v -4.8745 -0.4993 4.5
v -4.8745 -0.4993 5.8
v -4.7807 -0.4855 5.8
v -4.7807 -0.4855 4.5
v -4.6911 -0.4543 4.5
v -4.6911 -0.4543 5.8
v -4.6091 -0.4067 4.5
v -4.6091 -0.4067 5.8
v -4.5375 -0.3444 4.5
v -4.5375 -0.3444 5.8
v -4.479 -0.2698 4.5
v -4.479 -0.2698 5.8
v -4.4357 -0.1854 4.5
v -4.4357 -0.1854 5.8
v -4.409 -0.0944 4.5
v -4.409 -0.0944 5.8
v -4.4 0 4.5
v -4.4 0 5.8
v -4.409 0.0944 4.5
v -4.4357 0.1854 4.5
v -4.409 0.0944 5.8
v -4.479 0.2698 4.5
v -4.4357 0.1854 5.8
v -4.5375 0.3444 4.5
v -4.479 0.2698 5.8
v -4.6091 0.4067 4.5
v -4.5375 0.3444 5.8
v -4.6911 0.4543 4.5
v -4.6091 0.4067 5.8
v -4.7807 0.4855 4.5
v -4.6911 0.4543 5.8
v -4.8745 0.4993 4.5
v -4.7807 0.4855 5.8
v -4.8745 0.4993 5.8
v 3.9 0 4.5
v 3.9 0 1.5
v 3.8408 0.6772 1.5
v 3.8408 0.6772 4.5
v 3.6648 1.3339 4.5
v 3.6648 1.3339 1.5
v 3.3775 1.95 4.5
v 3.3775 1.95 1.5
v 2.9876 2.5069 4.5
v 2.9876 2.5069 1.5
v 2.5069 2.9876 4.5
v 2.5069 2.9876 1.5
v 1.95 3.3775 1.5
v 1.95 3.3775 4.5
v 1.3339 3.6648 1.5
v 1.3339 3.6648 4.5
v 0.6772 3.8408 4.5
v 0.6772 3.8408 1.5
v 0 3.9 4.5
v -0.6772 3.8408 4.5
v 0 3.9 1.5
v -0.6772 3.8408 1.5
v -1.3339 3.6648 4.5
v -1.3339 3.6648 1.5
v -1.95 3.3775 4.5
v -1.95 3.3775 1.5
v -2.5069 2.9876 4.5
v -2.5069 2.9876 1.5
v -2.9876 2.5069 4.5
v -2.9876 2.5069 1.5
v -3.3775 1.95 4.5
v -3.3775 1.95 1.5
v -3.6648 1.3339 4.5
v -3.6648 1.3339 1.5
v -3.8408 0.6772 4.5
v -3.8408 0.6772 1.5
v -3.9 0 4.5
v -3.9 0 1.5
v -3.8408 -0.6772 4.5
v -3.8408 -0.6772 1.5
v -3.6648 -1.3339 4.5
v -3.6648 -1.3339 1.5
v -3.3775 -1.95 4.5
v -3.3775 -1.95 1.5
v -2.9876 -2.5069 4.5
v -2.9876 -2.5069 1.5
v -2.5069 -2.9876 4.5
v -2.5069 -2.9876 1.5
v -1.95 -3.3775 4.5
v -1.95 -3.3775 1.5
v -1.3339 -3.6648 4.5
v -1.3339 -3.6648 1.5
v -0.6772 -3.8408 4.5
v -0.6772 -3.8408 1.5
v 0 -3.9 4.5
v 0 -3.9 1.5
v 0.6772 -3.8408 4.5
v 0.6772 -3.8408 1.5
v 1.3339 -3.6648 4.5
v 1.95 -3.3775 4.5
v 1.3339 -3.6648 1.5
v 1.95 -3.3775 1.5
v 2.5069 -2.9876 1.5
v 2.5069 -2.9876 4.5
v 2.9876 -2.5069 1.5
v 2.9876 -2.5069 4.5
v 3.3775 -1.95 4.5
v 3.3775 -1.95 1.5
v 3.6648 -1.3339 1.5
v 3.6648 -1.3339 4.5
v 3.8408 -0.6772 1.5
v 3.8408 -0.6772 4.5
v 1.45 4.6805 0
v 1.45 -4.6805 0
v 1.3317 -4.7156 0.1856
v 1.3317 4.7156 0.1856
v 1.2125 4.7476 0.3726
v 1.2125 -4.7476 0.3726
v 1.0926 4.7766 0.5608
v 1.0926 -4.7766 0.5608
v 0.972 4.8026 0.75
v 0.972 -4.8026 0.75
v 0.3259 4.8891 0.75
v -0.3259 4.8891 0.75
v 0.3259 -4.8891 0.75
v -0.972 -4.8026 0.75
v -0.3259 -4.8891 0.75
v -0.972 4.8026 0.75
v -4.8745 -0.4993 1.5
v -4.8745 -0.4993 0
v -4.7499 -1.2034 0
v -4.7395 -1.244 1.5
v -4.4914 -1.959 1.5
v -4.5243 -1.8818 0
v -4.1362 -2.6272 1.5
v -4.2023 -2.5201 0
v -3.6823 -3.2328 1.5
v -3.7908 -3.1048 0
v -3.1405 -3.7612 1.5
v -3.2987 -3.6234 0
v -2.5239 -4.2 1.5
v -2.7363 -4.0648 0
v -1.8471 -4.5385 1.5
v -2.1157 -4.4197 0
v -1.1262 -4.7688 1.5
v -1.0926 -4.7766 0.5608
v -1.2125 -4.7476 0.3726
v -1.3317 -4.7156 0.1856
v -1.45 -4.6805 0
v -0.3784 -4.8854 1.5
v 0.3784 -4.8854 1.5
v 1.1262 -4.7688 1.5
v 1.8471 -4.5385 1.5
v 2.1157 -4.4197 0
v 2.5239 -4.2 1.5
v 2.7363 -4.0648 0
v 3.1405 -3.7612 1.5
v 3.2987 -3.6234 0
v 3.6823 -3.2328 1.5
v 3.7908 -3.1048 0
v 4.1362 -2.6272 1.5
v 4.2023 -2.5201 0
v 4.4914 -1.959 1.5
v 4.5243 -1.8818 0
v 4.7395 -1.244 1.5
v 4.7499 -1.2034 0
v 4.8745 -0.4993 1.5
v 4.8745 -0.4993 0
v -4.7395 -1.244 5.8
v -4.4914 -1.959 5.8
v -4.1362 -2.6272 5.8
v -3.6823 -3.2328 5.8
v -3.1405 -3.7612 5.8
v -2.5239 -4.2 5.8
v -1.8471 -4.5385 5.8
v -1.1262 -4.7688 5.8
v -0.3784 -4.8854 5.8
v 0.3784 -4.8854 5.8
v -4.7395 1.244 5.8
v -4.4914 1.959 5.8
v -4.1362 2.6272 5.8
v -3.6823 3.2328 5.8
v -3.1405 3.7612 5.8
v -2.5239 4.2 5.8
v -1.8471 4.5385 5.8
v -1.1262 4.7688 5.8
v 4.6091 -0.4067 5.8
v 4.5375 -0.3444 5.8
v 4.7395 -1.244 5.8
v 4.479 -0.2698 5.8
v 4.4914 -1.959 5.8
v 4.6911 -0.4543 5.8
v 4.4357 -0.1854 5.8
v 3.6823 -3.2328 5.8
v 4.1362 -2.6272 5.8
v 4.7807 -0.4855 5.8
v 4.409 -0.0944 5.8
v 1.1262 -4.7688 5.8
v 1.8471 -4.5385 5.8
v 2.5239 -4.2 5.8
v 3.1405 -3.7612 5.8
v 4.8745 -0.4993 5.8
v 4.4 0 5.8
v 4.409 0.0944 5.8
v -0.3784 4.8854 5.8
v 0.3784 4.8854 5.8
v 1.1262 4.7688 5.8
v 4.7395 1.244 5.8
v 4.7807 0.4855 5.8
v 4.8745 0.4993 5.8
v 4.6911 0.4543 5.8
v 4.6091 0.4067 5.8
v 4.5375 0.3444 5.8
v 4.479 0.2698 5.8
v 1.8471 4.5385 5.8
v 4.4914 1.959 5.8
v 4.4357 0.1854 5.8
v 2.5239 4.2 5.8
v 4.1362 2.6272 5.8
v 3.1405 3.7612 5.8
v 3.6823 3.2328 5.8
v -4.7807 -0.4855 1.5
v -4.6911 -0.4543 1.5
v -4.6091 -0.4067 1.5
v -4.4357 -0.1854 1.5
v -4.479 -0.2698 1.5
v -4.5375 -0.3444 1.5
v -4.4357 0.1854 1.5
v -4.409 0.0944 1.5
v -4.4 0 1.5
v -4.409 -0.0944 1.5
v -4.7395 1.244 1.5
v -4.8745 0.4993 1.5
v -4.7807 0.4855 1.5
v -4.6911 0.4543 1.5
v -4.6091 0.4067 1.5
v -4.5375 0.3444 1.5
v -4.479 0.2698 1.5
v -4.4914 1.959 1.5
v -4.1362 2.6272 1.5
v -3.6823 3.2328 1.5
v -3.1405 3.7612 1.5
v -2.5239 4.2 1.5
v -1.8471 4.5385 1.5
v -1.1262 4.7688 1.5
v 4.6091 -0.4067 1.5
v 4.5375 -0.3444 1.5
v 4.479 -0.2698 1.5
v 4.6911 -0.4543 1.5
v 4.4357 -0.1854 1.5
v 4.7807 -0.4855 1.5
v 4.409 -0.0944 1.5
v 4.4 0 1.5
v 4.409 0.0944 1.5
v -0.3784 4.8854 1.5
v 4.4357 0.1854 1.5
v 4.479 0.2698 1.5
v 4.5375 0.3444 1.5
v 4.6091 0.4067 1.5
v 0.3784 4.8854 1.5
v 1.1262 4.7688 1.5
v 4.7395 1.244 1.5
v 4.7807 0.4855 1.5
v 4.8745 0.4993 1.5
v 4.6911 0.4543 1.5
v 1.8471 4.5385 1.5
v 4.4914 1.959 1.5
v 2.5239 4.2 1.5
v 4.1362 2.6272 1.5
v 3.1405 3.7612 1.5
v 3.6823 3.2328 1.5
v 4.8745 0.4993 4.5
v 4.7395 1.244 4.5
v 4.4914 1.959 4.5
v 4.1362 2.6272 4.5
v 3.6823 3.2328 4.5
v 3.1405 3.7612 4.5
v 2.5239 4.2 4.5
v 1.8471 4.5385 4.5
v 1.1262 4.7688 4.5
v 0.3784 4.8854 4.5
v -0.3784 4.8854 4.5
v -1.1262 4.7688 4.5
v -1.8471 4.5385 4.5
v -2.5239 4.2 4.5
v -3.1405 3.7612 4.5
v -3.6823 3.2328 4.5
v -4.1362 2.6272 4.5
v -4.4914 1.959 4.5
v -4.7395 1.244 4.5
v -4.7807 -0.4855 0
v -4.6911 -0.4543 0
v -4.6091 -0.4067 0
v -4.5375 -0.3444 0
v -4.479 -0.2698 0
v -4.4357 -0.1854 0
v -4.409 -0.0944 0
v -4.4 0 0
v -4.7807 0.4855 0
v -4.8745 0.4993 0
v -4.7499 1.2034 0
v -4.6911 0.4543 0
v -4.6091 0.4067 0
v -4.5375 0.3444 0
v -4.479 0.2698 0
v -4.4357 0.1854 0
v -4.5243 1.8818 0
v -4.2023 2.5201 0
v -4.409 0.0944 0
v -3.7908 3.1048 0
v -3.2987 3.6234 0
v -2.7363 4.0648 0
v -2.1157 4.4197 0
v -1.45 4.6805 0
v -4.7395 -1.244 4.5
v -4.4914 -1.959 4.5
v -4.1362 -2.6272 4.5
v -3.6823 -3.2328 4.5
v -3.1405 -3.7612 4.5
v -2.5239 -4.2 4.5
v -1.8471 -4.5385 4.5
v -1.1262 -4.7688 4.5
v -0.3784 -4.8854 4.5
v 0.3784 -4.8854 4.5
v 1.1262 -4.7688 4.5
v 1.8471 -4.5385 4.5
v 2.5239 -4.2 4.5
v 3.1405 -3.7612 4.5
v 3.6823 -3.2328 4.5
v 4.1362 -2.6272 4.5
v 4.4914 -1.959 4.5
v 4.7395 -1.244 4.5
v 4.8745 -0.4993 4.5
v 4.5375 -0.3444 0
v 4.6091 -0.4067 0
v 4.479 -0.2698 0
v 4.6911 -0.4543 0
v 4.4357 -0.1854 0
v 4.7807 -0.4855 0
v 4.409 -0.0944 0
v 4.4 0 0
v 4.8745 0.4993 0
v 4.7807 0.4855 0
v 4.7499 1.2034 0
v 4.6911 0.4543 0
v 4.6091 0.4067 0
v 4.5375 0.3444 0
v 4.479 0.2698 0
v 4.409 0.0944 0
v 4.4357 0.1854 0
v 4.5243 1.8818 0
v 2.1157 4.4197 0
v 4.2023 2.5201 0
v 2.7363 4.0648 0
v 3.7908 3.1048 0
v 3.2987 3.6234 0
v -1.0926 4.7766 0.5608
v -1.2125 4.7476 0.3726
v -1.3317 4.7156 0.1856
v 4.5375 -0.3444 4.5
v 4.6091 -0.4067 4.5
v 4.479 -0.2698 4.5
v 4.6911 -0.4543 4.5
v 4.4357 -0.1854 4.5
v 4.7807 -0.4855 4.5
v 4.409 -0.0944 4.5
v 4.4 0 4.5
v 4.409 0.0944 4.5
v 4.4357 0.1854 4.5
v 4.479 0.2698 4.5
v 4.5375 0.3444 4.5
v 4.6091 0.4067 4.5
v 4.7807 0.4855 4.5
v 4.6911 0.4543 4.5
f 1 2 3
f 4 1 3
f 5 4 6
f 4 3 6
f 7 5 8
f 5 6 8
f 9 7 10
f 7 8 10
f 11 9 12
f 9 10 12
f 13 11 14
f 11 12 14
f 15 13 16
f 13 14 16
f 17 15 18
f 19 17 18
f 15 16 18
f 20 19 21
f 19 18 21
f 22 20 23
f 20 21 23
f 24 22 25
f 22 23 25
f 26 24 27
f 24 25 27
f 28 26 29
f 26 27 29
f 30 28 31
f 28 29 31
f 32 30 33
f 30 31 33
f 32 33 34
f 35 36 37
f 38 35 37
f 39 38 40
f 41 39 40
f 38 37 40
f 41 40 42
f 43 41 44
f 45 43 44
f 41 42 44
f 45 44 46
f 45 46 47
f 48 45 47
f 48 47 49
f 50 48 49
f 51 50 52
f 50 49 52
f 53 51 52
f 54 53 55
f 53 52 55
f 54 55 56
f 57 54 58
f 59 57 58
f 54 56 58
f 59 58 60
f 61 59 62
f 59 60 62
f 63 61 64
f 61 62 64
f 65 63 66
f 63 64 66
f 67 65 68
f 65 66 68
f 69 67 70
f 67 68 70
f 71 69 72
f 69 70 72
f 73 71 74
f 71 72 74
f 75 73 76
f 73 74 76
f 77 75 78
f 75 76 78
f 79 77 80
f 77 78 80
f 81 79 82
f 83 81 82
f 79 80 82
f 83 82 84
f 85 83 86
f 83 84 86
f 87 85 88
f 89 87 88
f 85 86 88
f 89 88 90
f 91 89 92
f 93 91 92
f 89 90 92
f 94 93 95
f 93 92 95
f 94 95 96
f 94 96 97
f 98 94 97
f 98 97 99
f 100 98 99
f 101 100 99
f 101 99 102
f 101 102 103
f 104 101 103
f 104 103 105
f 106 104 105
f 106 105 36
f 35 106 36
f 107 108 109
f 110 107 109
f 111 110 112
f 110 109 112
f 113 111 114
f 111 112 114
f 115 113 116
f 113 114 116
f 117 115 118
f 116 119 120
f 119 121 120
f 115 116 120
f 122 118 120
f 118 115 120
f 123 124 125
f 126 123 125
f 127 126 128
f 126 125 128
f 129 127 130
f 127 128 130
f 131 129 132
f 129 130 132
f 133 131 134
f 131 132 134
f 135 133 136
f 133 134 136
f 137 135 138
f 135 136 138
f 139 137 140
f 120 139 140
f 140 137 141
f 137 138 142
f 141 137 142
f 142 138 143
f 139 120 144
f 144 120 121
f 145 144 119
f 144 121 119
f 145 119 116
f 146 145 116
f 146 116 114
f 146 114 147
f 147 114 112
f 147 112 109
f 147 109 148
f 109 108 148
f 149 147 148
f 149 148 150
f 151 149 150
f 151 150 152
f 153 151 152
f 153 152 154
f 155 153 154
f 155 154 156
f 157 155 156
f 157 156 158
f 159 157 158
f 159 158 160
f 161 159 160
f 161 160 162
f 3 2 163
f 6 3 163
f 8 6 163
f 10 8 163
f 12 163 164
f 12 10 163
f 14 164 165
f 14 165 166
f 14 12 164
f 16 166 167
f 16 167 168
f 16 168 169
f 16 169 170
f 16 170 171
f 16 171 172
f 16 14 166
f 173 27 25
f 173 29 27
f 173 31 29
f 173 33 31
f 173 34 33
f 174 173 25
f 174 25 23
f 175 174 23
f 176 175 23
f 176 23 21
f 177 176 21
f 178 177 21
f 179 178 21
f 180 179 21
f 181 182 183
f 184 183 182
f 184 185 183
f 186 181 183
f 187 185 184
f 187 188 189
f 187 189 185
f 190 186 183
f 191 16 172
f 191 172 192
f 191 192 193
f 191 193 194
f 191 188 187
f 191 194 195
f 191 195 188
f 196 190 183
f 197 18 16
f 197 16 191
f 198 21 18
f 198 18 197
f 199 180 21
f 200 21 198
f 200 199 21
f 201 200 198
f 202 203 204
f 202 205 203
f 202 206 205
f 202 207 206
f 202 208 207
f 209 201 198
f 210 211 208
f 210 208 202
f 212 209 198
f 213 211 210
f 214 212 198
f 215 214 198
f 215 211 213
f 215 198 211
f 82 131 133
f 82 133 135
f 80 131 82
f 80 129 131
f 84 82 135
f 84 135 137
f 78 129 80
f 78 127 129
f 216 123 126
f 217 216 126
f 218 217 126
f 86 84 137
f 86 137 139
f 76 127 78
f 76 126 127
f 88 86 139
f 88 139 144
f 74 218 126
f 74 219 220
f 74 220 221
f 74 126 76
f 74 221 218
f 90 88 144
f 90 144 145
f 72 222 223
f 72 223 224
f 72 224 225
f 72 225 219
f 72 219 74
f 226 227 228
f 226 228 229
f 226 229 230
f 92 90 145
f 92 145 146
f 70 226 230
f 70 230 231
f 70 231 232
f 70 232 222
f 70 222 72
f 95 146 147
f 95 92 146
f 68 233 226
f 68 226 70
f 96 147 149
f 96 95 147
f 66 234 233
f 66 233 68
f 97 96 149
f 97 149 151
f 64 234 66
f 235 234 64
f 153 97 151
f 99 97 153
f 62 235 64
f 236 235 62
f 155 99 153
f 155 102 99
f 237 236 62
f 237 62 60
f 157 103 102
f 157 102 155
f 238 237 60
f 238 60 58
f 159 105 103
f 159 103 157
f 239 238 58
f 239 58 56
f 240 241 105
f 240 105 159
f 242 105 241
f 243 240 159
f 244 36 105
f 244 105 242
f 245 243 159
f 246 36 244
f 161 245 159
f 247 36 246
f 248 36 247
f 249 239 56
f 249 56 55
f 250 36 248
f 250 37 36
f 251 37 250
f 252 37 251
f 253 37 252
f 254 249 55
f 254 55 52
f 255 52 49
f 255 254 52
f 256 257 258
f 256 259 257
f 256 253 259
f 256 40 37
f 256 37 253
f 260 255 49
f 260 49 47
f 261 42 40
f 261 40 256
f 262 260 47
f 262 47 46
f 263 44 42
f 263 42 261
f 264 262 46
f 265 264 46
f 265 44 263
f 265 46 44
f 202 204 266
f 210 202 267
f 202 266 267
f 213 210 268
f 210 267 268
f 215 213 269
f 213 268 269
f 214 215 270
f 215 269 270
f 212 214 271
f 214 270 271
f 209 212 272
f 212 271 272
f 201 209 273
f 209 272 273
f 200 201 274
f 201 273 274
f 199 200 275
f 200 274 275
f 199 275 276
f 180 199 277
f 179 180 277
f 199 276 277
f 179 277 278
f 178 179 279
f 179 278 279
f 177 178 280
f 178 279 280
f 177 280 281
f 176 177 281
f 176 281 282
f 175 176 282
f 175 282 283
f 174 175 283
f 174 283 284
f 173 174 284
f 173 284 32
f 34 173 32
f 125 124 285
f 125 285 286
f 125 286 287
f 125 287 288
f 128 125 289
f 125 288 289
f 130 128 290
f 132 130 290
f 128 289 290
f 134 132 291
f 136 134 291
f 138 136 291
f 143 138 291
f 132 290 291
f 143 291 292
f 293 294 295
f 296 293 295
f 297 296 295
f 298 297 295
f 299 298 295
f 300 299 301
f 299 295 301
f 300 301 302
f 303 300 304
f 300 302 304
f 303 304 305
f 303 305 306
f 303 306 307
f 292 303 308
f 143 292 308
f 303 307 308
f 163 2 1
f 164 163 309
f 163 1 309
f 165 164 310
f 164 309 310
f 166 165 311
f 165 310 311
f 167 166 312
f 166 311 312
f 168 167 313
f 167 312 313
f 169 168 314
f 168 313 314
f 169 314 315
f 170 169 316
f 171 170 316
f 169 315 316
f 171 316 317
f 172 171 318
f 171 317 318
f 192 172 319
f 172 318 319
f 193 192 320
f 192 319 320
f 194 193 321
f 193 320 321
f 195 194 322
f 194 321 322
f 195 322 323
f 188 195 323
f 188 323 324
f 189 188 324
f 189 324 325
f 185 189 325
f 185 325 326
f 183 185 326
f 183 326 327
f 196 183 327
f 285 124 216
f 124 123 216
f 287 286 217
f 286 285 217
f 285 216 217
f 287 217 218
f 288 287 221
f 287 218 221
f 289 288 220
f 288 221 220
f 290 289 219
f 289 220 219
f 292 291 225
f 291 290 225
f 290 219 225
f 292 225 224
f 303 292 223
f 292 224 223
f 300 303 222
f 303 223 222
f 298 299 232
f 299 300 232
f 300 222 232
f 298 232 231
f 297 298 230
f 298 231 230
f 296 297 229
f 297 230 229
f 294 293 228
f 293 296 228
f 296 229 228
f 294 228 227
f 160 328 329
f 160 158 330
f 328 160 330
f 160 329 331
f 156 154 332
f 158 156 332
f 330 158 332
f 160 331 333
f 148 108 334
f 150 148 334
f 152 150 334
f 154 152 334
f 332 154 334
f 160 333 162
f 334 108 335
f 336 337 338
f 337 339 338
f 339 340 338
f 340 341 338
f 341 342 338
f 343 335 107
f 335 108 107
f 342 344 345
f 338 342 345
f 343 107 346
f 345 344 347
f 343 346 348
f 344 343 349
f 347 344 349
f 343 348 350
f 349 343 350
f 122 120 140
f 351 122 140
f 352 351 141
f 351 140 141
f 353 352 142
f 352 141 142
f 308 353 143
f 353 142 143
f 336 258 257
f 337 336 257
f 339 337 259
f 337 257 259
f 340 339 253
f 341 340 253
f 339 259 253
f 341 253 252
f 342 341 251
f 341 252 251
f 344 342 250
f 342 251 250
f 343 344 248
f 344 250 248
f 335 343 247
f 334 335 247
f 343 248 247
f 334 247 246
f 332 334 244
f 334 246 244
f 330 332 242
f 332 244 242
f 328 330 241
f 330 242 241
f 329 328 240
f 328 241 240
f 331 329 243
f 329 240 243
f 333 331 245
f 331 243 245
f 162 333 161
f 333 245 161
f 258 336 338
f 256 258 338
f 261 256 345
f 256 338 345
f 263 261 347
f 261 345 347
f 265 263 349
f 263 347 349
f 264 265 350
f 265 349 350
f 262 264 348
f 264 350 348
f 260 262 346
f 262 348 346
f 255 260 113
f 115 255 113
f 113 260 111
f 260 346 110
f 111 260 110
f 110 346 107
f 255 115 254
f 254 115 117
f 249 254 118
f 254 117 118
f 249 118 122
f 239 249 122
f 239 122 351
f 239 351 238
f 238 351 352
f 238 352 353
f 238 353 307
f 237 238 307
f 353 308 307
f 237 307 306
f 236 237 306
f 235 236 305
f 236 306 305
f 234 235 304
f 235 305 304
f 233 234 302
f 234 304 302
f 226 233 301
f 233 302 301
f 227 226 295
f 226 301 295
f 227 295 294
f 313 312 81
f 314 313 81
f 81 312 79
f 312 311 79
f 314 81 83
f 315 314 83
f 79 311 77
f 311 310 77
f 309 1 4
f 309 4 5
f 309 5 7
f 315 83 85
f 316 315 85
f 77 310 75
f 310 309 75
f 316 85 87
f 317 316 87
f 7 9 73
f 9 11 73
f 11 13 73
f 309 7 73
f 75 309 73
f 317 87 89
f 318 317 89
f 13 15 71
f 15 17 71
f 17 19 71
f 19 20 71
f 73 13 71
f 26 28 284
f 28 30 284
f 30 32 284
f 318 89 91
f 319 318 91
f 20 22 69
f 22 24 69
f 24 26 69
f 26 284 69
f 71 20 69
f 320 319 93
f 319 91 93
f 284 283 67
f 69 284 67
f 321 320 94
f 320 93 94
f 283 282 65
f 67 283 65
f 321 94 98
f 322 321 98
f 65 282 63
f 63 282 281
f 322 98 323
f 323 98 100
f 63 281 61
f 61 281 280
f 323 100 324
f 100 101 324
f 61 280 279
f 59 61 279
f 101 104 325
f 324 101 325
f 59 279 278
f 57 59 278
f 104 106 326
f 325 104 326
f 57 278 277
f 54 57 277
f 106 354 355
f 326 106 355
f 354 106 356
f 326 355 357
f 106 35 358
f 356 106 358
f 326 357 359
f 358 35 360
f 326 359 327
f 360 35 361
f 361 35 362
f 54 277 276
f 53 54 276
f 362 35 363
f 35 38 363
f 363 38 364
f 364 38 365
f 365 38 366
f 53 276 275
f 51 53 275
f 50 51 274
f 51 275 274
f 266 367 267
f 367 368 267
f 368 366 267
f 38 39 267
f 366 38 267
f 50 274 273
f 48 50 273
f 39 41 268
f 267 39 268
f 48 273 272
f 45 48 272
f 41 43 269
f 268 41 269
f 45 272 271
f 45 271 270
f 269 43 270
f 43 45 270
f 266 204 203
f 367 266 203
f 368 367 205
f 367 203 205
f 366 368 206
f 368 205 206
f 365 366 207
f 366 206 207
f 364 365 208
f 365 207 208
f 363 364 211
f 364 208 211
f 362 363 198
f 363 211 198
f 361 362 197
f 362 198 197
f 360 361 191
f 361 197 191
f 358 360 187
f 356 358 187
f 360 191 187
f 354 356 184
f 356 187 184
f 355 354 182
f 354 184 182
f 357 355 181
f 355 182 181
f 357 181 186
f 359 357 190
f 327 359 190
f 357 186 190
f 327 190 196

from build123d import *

# Parameters (mm, degrees)
SKETCH_1_R               = 4.9
EXTRUDE_1_DEPTH          = 1.5
SKETCH_3_R               = 3.9
EXTRUDE_2_DEPTH          = 3
SKETCH_4_R               = 4.9
EXTRUDE_3_DEPTH          = 1.3
CUT_EXTRUDE_1_DEPTH      = 10.036592278
CUT_EXTRUDE_1_DEPTH_BACK = 10.036592278
SKETCH_6_R               = 0.5
CUT_EXTRUDE_2_DEPTH      = 10.036592278


with BuildPart() as part:
    # Эскиз1 → Бобышка-Вытянуть1 (new body)
    with BuildSketch(Plane.XY):
        Circle(SKETCH_1_R)
    extrude(amount=EXTRUDE_1_DEPTH)

    # Эскиз3 → Бобышка-Вытянуть2 (add)
    with BuildSketch(Plane.XY.offset(1.5)):
        Circle(SKETCH_3_R)
    extrude(amount=EXTRUDE_2_DEPTH)

    # Эскиз4 → Бобышка-Вытянуть3 (add)
    with BuildSketch(Plane.XY.offset(4.5)):
        Circle(SKETCH_4_R)
    extrude(amount=EXTRUDE_3_DEPTH)

    # Эскиз5 → Вырез-Вытянуть1 (cut, two sides: drawn at the far end of the back side and taken through both)
    with BuildSketch(Plane(origin=(0, 0, 0), x_dir=(1, 0, 0), z_dir=(0, 1, 0)).offset(-CUT_EXTRUDE_1_DEPTH_BACK)):
        Polygon((1.45, 0), (0.971990262, -0.75), (-0.971990262, -0.75), (-1.45, 0), (-1.45, 0.521018793), (1.45, 0.521018793), align=None)
    extrude(amount=CUT_EXTRUDE_1_DEPTH + CUT_EXTRUDE_1_DEPTH_BACK, mode=Mode.SUBTRACT)

    # Эскиз6 → Вырез-Вытянуть2 (cut, through all)
    with BuildSketch(Plane.XY.offset(5.8)):
        with Locations((-4.9, 0)):
            Circle(SKETCH_6_R)
        with Locations((4.9, 0)):
            Circle(SKETCH_6_R)
    extrude(amount=-CUT_EXTRUDE_2_DEPTH, mode=Mode.SUBTRACT)


solid = part.part
